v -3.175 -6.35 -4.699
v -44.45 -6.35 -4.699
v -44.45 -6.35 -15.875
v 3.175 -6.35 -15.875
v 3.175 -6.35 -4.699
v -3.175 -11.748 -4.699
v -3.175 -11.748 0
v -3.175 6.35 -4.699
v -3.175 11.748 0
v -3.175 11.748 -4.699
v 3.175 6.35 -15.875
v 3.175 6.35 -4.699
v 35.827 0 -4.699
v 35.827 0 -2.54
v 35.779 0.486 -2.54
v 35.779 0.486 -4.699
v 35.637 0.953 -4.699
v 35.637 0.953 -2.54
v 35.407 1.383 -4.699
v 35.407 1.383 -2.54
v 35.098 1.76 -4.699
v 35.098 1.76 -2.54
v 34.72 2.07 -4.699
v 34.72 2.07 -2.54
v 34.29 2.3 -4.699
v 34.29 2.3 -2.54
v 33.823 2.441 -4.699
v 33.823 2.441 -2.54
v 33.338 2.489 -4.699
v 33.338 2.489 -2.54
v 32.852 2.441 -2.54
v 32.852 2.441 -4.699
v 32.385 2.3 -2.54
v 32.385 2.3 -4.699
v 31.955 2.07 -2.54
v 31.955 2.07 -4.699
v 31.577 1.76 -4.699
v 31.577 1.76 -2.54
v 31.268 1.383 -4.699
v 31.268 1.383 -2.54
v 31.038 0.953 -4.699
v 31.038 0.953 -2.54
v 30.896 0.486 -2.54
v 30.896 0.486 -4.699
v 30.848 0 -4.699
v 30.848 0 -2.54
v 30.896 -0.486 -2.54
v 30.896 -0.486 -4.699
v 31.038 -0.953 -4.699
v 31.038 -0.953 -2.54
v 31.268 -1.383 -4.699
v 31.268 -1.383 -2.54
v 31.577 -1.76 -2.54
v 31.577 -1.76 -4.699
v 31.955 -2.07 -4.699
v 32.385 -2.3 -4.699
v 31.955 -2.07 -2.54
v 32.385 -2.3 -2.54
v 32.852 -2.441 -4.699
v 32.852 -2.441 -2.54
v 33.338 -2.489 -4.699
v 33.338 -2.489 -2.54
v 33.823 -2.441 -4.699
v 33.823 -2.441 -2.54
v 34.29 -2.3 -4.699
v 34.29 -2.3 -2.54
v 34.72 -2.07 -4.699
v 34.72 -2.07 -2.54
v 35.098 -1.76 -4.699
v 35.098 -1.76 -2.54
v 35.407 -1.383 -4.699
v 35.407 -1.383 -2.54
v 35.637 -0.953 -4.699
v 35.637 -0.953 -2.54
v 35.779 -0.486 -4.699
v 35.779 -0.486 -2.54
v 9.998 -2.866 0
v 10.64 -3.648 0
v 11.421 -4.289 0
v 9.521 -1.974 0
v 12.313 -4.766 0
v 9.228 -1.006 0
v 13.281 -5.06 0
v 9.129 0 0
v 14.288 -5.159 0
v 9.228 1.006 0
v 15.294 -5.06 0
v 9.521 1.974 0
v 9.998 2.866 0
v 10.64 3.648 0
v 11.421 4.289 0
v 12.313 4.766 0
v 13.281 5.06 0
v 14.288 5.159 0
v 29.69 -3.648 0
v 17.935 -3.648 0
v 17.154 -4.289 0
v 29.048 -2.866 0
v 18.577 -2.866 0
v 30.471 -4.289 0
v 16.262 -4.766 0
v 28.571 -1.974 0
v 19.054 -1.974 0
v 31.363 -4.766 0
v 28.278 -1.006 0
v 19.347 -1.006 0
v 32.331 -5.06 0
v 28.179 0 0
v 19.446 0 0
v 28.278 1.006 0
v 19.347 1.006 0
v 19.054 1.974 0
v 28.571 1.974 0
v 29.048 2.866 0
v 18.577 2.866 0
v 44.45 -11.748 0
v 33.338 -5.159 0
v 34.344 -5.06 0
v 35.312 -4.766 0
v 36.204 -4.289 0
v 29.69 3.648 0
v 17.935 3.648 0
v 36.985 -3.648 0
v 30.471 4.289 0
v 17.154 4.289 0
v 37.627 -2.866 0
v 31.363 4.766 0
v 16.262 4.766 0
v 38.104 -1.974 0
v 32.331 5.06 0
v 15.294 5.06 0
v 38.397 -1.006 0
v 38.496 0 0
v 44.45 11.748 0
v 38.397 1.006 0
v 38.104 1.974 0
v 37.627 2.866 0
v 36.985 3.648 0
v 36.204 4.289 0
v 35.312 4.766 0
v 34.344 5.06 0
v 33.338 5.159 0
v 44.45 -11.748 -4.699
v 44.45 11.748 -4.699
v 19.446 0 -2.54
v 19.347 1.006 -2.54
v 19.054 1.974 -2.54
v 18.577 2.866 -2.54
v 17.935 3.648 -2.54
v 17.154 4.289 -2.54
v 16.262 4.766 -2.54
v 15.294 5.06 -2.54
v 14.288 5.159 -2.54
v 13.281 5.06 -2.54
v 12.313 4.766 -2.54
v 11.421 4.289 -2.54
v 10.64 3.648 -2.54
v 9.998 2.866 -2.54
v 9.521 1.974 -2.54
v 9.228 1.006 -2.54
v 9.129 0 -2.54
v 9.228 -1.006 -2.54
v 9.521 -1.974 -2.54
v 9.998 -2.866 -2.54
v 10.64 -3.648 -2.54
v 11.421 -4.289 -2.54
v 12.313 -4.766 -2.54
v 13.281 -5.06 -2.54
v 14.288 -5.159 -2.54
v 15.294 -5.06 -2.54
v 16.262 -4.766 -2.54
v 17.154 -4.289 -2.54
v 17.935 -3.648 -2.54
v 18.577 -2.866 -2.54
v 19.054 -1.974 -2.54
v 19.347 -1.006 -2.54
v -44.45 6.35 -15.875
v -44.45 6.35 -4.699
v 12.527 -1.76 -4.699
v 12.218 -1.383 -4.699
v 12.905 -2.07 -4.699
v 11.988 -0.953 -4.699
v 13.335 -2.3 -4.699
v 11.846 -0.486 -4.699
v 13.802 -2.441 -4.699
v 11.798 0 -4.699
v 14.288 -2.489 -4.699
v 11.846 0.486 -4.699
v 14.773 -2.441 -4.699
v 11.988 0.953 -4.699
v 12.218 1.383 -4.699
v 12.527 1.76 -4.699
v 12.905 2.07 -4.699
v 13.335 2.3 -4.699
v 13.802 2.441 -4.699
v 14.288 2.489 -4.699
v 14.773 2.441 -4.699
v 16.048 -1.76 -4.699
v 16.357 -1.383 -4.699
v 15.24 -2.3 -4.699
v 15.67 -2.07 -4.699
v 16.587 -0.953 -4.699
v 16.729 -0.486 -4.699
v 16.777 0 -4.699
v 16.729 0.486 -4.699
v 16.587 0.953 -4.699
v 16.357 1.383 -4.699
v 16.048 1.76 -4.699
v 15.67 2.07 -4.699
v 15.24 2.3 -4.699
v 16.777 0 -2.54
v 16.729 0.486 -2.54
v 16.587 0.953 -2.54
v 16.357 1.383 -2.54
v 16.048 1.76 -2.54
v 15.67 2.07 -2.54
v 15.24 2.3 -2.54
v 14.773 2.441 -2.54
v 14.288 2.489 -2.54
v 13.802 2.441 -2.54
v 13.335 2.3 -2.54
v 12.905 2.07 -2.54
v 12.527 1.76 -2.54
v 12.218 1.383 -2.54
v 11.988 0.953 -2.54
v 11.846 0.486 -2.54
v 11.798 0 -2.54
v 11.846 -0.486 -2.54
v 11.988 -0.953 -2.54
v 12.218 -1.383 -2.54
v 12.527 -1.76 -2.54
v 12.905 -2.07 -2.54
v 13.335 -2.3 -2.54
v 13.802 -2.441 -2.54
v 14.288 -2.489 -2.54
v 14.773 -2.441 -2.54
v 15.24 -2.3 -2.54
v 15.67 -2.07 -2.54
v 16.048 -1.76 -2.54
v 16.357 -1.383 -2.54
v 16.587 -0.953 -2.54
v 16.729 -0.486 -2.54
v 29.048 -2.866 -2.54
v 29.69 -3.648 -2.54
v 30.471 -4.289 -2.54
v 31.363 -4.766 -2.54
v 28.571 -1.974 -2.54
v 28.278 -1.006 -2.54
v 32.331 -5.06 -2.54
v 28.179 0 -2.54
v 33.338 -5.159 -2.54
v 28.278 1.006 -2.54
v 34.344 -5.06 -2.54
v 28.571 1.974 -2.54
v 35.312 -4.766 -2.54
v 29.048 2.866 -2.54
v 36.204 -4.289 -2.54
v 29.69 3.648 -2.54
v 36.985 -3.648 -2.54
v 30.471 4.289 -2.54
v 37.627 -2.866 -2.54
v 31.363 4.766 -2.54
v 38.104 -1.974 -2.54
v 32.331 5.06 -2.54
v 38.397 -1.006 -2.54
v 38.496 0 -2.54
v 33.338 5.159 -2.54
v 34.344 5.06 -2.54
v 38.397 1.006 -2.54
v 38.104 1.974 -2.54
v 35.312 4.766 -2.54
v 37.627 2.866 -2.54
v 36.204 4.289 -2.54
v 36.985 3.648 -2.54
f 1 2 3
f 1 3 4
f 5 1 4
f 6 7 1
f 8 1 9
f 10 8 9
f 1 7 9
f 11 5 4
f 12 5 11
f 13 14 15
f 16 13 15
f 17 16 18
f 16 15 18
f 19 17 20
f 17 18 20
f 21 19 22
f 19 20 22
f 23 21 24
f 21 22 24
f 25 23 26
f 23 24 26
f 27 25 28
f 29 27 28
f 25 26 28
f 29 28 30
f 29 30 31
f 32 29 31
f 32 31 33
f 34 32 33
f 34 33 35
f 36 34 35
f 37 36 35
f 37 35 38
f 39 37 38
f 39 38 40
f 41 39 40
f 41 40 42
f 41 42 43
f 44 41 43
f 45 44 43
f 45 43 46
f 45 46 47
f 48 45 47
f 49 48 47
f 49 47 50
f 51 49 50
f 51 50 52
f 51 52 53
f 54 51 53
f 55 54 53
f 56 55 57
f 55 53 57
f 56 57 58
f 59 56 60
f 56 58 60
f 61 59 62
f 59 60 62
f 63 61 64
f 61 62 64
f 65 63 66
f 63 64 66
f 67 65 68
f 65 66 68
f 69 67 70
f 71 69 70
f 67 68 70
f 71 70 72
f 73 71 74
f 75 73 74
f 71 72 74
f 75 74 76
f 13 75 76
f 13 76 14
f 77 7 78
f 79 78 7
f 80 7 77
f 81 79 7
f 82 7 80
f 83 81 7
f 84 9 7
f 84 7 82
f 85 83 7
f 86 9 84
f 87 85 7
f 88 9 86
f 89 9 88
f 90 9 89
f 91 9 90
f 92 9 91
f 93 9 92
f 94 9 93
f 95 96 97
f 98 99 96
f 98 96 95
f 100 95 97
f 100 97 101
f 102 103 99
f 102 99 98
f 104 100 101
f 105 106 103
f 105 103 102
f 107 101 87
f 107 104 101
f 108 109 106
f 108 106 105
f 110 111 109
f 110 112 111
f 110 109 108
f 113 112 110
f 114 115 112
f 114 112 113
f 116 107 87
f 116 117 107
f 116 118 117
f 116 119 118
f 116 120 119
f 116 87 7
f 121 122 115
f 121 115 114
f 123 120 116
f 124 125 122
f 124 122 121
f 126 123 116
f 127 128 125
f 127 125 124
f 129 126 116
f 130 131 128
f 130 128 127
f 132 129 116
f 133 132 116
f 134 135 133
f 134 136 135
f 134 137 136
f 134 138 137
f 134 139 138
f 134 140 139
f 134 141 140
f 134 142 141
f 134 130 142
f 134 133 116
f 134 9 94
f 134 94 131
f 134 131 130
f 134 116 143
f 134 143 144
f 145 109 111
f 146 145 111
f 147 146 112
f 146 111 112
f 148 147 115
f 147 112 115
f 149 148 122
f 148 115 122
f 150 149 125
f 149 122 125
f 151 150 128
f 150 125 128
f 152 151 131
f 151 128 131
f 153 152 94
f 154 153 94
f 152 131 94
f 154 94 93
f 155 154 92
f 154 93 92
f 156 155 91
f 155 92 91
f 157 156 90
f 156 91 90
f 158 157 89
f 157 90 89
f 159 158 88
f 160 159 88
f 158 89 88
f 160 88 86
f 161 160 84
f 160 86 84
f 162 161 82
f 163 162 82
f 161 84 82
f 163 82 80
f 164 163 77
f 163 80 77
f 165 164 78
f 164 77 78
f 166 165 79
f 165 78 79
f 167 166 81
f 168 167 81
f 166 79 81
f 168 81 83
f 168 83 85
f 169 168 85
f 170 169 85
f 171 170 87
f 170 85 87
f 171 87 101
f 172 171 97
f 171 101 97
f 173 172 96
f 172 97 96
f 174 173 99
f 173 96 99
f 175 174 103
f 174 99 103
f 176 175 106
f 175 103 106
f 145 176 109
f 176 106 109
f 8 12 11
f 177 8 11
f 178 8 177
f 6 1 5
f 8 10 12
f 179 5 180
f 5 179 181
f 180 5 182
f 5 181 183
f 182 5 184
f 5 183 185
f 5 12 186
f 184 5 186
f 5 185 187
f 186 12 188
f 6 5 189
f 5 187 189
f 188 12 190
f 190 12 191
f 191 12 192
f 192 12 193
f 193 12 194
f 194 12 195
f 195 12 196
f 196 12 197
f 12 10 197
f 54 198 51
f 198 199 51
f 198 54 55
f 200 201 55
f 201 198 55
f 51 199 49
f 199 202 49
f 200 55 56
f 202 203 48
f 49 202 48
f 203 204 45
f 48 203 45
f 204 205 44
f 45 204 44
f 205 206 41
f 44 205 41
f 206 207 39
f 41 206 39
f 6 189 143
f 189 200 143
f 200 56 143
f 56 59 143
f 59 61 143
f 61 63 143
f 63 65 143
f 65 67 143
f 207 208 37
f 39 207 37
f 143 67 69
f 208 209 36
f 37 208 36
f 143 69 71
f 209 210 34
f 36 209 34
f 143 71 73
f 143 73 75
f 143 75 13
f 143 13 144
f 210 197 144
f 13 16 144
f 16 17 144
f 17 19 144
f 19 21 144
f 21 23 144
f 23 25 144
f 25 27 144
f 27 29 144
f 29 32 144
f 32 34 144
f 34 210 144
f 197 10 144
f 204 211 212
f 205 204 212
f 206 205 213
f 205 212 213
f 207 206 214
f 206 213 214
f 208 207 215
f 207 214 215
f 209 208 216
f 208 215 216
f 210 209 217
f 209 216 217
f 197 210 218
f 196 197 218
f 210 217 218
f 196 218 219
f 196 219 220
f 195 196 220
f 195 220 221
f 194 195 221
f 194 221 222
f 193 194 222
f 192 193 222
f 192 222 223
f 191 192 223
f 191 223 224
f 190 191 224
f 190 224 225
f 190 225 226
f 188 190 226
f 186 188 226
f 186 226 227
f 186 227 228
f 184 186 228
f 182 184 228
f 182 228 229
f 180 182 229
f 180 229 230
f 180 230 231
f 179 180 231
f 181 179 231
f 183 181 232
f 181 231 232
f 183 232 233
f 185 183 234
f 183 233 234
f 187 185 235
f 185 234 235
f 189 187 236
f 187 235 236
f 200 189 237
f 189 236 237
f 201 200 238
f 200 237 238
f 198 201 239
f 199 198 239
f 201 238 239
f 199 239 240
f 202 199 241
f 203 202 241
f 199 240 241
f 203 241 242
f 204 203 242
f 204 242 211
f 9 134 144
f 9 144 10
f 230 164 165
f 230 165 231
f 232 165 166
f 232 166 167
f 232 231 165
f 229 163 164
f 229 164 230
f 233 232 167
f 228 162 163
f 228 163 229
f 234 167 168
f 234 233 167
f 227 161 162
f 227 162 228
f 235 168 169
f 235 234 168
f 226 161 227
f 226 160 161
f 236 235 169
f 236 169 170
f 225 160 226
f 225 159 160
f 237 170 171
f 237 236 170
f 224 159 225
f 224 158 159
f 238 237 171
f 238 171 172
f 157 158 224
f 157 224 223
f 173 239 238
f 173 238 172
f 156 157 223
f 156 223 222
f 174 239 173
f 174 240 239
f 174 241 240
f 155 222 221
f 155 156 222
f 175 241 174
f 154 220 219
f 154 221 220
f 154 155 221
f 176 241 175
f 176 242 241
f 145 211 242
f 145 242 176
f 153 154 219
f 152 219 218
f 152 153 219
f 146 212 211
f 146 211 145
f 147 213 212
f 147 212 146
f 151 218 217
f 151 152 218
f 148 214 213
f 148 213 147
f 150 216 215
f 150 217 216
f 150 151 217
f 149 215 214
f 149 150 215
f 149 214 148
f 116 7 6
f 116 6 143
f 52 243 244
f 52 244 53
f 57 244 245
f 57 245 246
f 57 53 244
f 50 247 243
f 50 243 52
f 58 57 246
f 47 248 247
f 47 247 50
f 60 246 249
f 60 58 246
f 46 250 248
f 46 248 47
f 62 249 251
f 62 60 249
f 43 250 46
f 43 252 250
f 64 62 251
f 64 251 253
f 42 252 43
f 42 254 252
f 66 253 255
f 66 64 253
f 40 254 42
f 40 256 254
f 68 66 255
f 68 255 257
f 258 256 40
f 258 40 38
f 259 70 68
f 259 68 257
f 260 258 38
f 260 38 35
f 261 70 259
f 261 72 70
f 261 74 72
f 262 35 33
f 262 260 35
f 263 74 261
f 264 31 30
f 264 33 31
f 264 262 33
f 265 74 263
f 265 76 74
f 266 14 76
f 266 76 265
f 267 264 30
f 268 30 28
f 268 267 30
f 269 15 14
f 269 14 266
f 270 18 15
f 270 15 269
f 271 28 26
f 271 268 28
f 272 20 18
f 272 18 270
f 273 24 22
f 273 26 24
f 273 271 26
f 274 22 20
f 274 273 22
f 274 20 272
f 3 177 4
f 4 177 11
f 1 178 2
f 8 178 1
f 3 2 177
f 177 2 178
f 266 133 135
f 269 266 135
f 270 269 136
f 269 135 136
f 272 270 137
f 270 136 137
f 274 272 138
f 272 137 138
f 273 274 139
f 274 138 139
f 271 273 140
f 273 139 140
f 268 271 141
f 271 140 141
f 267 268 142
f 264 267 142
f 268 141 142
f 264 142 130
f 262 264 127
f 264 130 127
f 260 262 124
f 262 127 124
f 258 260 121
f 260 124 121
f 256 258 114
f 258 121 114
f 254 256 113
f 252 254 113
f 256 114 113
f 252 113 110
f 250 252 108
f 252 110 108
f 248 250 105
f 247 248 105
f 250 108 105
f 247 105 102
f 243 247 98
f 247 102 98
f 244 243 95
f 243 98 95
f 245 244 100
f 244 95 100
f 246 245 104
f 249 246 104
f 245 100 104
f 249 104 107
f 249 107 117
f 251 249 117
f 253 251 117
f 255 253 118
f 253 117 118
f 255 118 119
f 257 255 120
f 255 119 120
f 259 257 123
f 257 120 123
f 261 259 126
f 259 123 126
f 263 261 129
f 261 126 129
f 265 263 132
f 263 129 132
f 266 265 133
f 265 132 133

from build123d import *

# Parameters (mm, degrees)
F0_R     = 5.15874
F0_R_2   = 2.4892
F0_W     = 6.35
F0_H     = 5.3975
F0_H_2   = 12.7
F1_DEPTH = 4.699
F0_W_2   = 41.275
F2_DEPTH = 15.875
F3_DEPTH = 2.54
F4_DEPTH = 4.699


with BuildPart() as f1:
    # F0 (on Top) → F1 (new body)
    with BuildSketch(Plane.XY):
        Polygon((44.45, 11.7475), (3.175, 11.7475), (3.175, 6.35), (3.175, -6.35), (3.175, -11.7475), (44.45, -11.7475), align=None)
        with Locations((14.2875, 0)):
            Circle(F0_R, mode=Mode.SUBTRACT)
        with Locations((33.3375, 0)):
            Circle(F0_R, mode=Mode.SUBTRACT)
        with Locations((14.2875, 0)):
            Circle(F0_R)
        with Locations((14.2875, 0)):
            Circle(F0_R_2, mode=Mode.SUBTRACT)
        with Locations((33.3375, 0)):
            Circle(F0_R)
        with Locations((33.3375, 0)):
            Circle(F0_R_2, mode=Mode.SUBTRACT)
        with Locations((0, 9.04875)):
            Rectangle(F0_W, F0_H)
        Rectangle(F0_W, F0_H_2)
        with Locations((0, -9.04875)):
            Rectangle(F0_W, F0_H)
    extrude(amount=-F1_DEPTH)

    # F0 (on Top) → F2 (join)
    with BuildSketch(Plane.XY):
        with Locations((-23.8125, 0)):
            Rectangle(F0_W_2, F0_H_2)
        Rectangle(F0_W, F0_H_2)
    extrude(amount=-F2_DEPTH)

    # F0 (on Top) → F3 (cut)
    with BuildSketch(Plane.XY):
        with Locations((14.2875, 0)):
            Circle(F0_R)
        with Locations((14.2875, 0)):
            Circle(F0_R_2, mode=Mode.SUBTRACT)
        with Locations((33.3375, 0)):
            Circle(F0_R)
        with Locations((33.3375, 0)):
            Circle(F0_R_2, mode=Mode.SUBTRACT)
    extrude(amount=-F3_DEPTH, mode=Mode.SUBTRACT)

    # F0 (on Top) → F4 (cut)
    with BuildSketch(Plane.XY):
        with Locations((-23.8125, 0)):
            Rectangle(F0_W_2, F0_H_2)
    extrude(amount=-F4_DEPTH, mode=Mode.SUBTRACT)


solid = f1.part
